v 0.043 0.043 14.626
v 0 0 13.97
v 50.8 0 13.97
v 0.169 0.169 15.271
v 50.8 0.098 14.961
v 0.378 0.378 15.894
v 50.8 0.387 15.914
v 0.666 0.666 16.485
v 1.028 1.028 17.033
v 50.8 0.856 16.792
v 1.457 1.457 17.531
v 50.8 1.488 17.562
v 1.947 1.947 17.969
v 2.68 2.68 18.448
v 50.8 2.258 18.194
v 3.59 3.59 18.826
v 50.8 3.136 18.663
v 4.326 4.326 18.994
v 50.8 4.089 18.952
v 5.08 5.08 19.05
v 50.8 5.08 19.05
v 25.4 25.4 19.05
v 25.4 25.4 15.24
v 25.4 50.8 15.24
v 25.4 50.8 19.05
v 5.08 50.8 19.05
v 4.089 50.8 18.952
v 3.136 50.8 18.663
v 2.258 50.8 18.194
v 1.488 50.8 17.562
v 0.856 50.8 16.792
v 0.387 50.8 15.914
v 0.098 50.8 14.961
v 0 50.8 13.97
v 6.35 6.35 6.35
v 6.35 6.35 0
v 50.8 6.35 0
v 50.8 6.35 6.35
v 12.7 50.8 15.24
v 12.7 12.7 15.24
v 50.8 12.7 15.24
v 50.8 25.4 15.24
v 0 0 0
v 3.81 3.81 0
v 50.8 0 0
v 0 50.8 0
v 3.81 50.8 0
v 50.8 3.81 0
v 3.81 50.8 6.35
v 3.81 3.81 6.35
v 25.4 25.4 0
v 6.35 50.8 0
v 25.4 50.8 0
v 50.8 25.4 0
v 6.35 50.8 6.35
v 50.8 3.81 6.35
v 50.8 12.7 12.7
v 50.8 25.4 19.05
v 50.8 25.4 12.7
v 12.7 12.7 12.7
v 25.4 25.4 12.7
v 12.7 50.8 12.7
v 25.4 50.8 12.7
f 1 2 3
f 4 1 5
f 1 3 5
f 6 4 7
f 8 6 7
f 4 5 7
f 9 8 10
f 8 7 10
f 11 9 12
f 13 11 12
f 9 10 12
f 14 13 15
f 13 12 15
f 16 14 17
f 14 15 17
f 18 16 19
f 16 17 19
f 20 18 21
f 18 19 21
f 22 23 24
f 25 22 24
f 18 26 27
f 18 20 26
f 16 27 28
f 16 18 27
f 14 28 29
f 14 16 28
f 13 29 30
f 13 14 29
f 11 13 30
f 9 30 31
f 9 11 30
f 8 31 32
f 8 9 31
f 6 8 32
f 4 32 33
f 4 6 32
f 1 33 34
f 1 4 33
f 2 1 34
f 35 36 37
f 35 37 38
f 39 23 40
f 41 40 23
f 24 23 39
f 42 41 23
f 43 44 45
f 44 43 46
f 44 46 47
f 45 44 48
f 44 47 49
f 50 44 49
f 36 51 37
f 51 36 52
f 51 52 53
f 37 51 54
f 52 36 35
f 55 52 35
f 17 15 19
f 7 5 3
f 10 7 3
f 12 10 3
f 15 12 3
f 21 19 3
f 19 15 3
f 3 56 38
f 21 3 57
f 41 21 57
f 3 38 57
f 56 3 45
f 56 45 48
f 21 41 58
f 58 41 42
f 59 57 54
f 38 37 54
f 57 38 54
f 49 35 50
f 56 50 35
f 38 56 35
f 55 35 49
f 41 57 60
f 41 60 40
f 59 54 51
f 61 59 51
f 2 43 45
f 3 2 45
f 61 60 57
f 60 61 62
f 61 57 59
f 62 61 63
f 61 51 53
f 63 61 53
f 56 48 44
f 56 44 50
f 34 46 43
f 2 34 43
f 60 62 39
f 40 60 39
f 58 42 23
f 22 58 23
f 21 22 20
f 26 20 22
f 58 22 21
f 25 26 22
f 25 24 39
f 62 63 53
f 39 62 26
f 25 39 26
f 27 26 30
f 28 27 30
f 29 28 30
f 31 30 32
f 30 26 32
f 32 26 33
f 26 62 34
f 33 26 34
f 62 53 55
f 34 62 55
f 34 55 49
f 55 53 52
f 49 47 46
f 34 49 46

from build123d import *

# Parameters (mm, degrees)
F1_DEPTH = 19.05
F2_W     = 2.54
F2_H     = 6.35
F3_DEPTH = 46.99
F2_W_2   = 12.7
F2_H_2   = 2.54
F4_DEPTH = 38.1
F5_W     = 12.7
F5_H     = 2.54
F6_DEPTH = 38.1
F5_W_2   = 2.54
F5_H_2   = 6.35
F7_DEPTH = 46.736
F8_R     = 5.08


with BuildPart() as f1:
    # F0 (on Top) → F1 (new body)
    with BuildSketch(Plane.XY):
        Polygon((0, 25.4), (0, 0), (25.4, 0), (50.8, 0), (50.8, 25.4), (25.4, 25.4), (25.4, 50.8), (0, 50.8), align=None)
    extrude(amount=F1_DEPTH)

    # F2 (on face) → F3 (cut)
    with BuildSketch(Plane.YZ.offset(50.8)):
        with Locations((5.08, 3.175)):
            Rectangle(F2_W, F2_H)
    extrude(amount=-F3_DEPTH, mode=Mode.SUBTRACT)

    # F2 (on face) → F4 (cut)
    with BuildSketch(Plane.YZ.offset(50.8)):
        with Locations((19.05, 13.97)):
            Rectangle(F2_W_2, F2_H_2)
    extrude(amount=-F4_DEPTH, mode=Mode.SUBTRACT)

    # F5 (on face) → F6 (cut)
    with BuildSketch(Plane(origin=(0, 50.8, 0), x_dir=(-1, 0, 0), z_dir=(0, 1, 0))):
        with Locations((-19.05, 13.97)):
            Rectangle(F5_W, F5_H)
    extrude(amount=-F6_DEPTH, mode=Mode.SUBTRACT)

    # F5 (on face) → F7 (cut)
    with BuildSketch(Plane(origin=(0, 50.8, 0), x_dir=(-1, 0, 0), z_dir=(0, 1, 0))):
        with Locations((-5.08, 3.175)):
            Rectangle(F5_W_2, F5_H_2)
    extrude(amount=-F7_DEPTH, mode=Mode.SUBTRACT)

    # F8
    f8_edges = [f1.edges().sort_by_distance(p)[0] for p in [
        (25.4, 0, 19.05),
        (0, 25.4, 19.05),
    ]]
    fillet(f8_edges, radius=F8_R)


solid = f1.part
